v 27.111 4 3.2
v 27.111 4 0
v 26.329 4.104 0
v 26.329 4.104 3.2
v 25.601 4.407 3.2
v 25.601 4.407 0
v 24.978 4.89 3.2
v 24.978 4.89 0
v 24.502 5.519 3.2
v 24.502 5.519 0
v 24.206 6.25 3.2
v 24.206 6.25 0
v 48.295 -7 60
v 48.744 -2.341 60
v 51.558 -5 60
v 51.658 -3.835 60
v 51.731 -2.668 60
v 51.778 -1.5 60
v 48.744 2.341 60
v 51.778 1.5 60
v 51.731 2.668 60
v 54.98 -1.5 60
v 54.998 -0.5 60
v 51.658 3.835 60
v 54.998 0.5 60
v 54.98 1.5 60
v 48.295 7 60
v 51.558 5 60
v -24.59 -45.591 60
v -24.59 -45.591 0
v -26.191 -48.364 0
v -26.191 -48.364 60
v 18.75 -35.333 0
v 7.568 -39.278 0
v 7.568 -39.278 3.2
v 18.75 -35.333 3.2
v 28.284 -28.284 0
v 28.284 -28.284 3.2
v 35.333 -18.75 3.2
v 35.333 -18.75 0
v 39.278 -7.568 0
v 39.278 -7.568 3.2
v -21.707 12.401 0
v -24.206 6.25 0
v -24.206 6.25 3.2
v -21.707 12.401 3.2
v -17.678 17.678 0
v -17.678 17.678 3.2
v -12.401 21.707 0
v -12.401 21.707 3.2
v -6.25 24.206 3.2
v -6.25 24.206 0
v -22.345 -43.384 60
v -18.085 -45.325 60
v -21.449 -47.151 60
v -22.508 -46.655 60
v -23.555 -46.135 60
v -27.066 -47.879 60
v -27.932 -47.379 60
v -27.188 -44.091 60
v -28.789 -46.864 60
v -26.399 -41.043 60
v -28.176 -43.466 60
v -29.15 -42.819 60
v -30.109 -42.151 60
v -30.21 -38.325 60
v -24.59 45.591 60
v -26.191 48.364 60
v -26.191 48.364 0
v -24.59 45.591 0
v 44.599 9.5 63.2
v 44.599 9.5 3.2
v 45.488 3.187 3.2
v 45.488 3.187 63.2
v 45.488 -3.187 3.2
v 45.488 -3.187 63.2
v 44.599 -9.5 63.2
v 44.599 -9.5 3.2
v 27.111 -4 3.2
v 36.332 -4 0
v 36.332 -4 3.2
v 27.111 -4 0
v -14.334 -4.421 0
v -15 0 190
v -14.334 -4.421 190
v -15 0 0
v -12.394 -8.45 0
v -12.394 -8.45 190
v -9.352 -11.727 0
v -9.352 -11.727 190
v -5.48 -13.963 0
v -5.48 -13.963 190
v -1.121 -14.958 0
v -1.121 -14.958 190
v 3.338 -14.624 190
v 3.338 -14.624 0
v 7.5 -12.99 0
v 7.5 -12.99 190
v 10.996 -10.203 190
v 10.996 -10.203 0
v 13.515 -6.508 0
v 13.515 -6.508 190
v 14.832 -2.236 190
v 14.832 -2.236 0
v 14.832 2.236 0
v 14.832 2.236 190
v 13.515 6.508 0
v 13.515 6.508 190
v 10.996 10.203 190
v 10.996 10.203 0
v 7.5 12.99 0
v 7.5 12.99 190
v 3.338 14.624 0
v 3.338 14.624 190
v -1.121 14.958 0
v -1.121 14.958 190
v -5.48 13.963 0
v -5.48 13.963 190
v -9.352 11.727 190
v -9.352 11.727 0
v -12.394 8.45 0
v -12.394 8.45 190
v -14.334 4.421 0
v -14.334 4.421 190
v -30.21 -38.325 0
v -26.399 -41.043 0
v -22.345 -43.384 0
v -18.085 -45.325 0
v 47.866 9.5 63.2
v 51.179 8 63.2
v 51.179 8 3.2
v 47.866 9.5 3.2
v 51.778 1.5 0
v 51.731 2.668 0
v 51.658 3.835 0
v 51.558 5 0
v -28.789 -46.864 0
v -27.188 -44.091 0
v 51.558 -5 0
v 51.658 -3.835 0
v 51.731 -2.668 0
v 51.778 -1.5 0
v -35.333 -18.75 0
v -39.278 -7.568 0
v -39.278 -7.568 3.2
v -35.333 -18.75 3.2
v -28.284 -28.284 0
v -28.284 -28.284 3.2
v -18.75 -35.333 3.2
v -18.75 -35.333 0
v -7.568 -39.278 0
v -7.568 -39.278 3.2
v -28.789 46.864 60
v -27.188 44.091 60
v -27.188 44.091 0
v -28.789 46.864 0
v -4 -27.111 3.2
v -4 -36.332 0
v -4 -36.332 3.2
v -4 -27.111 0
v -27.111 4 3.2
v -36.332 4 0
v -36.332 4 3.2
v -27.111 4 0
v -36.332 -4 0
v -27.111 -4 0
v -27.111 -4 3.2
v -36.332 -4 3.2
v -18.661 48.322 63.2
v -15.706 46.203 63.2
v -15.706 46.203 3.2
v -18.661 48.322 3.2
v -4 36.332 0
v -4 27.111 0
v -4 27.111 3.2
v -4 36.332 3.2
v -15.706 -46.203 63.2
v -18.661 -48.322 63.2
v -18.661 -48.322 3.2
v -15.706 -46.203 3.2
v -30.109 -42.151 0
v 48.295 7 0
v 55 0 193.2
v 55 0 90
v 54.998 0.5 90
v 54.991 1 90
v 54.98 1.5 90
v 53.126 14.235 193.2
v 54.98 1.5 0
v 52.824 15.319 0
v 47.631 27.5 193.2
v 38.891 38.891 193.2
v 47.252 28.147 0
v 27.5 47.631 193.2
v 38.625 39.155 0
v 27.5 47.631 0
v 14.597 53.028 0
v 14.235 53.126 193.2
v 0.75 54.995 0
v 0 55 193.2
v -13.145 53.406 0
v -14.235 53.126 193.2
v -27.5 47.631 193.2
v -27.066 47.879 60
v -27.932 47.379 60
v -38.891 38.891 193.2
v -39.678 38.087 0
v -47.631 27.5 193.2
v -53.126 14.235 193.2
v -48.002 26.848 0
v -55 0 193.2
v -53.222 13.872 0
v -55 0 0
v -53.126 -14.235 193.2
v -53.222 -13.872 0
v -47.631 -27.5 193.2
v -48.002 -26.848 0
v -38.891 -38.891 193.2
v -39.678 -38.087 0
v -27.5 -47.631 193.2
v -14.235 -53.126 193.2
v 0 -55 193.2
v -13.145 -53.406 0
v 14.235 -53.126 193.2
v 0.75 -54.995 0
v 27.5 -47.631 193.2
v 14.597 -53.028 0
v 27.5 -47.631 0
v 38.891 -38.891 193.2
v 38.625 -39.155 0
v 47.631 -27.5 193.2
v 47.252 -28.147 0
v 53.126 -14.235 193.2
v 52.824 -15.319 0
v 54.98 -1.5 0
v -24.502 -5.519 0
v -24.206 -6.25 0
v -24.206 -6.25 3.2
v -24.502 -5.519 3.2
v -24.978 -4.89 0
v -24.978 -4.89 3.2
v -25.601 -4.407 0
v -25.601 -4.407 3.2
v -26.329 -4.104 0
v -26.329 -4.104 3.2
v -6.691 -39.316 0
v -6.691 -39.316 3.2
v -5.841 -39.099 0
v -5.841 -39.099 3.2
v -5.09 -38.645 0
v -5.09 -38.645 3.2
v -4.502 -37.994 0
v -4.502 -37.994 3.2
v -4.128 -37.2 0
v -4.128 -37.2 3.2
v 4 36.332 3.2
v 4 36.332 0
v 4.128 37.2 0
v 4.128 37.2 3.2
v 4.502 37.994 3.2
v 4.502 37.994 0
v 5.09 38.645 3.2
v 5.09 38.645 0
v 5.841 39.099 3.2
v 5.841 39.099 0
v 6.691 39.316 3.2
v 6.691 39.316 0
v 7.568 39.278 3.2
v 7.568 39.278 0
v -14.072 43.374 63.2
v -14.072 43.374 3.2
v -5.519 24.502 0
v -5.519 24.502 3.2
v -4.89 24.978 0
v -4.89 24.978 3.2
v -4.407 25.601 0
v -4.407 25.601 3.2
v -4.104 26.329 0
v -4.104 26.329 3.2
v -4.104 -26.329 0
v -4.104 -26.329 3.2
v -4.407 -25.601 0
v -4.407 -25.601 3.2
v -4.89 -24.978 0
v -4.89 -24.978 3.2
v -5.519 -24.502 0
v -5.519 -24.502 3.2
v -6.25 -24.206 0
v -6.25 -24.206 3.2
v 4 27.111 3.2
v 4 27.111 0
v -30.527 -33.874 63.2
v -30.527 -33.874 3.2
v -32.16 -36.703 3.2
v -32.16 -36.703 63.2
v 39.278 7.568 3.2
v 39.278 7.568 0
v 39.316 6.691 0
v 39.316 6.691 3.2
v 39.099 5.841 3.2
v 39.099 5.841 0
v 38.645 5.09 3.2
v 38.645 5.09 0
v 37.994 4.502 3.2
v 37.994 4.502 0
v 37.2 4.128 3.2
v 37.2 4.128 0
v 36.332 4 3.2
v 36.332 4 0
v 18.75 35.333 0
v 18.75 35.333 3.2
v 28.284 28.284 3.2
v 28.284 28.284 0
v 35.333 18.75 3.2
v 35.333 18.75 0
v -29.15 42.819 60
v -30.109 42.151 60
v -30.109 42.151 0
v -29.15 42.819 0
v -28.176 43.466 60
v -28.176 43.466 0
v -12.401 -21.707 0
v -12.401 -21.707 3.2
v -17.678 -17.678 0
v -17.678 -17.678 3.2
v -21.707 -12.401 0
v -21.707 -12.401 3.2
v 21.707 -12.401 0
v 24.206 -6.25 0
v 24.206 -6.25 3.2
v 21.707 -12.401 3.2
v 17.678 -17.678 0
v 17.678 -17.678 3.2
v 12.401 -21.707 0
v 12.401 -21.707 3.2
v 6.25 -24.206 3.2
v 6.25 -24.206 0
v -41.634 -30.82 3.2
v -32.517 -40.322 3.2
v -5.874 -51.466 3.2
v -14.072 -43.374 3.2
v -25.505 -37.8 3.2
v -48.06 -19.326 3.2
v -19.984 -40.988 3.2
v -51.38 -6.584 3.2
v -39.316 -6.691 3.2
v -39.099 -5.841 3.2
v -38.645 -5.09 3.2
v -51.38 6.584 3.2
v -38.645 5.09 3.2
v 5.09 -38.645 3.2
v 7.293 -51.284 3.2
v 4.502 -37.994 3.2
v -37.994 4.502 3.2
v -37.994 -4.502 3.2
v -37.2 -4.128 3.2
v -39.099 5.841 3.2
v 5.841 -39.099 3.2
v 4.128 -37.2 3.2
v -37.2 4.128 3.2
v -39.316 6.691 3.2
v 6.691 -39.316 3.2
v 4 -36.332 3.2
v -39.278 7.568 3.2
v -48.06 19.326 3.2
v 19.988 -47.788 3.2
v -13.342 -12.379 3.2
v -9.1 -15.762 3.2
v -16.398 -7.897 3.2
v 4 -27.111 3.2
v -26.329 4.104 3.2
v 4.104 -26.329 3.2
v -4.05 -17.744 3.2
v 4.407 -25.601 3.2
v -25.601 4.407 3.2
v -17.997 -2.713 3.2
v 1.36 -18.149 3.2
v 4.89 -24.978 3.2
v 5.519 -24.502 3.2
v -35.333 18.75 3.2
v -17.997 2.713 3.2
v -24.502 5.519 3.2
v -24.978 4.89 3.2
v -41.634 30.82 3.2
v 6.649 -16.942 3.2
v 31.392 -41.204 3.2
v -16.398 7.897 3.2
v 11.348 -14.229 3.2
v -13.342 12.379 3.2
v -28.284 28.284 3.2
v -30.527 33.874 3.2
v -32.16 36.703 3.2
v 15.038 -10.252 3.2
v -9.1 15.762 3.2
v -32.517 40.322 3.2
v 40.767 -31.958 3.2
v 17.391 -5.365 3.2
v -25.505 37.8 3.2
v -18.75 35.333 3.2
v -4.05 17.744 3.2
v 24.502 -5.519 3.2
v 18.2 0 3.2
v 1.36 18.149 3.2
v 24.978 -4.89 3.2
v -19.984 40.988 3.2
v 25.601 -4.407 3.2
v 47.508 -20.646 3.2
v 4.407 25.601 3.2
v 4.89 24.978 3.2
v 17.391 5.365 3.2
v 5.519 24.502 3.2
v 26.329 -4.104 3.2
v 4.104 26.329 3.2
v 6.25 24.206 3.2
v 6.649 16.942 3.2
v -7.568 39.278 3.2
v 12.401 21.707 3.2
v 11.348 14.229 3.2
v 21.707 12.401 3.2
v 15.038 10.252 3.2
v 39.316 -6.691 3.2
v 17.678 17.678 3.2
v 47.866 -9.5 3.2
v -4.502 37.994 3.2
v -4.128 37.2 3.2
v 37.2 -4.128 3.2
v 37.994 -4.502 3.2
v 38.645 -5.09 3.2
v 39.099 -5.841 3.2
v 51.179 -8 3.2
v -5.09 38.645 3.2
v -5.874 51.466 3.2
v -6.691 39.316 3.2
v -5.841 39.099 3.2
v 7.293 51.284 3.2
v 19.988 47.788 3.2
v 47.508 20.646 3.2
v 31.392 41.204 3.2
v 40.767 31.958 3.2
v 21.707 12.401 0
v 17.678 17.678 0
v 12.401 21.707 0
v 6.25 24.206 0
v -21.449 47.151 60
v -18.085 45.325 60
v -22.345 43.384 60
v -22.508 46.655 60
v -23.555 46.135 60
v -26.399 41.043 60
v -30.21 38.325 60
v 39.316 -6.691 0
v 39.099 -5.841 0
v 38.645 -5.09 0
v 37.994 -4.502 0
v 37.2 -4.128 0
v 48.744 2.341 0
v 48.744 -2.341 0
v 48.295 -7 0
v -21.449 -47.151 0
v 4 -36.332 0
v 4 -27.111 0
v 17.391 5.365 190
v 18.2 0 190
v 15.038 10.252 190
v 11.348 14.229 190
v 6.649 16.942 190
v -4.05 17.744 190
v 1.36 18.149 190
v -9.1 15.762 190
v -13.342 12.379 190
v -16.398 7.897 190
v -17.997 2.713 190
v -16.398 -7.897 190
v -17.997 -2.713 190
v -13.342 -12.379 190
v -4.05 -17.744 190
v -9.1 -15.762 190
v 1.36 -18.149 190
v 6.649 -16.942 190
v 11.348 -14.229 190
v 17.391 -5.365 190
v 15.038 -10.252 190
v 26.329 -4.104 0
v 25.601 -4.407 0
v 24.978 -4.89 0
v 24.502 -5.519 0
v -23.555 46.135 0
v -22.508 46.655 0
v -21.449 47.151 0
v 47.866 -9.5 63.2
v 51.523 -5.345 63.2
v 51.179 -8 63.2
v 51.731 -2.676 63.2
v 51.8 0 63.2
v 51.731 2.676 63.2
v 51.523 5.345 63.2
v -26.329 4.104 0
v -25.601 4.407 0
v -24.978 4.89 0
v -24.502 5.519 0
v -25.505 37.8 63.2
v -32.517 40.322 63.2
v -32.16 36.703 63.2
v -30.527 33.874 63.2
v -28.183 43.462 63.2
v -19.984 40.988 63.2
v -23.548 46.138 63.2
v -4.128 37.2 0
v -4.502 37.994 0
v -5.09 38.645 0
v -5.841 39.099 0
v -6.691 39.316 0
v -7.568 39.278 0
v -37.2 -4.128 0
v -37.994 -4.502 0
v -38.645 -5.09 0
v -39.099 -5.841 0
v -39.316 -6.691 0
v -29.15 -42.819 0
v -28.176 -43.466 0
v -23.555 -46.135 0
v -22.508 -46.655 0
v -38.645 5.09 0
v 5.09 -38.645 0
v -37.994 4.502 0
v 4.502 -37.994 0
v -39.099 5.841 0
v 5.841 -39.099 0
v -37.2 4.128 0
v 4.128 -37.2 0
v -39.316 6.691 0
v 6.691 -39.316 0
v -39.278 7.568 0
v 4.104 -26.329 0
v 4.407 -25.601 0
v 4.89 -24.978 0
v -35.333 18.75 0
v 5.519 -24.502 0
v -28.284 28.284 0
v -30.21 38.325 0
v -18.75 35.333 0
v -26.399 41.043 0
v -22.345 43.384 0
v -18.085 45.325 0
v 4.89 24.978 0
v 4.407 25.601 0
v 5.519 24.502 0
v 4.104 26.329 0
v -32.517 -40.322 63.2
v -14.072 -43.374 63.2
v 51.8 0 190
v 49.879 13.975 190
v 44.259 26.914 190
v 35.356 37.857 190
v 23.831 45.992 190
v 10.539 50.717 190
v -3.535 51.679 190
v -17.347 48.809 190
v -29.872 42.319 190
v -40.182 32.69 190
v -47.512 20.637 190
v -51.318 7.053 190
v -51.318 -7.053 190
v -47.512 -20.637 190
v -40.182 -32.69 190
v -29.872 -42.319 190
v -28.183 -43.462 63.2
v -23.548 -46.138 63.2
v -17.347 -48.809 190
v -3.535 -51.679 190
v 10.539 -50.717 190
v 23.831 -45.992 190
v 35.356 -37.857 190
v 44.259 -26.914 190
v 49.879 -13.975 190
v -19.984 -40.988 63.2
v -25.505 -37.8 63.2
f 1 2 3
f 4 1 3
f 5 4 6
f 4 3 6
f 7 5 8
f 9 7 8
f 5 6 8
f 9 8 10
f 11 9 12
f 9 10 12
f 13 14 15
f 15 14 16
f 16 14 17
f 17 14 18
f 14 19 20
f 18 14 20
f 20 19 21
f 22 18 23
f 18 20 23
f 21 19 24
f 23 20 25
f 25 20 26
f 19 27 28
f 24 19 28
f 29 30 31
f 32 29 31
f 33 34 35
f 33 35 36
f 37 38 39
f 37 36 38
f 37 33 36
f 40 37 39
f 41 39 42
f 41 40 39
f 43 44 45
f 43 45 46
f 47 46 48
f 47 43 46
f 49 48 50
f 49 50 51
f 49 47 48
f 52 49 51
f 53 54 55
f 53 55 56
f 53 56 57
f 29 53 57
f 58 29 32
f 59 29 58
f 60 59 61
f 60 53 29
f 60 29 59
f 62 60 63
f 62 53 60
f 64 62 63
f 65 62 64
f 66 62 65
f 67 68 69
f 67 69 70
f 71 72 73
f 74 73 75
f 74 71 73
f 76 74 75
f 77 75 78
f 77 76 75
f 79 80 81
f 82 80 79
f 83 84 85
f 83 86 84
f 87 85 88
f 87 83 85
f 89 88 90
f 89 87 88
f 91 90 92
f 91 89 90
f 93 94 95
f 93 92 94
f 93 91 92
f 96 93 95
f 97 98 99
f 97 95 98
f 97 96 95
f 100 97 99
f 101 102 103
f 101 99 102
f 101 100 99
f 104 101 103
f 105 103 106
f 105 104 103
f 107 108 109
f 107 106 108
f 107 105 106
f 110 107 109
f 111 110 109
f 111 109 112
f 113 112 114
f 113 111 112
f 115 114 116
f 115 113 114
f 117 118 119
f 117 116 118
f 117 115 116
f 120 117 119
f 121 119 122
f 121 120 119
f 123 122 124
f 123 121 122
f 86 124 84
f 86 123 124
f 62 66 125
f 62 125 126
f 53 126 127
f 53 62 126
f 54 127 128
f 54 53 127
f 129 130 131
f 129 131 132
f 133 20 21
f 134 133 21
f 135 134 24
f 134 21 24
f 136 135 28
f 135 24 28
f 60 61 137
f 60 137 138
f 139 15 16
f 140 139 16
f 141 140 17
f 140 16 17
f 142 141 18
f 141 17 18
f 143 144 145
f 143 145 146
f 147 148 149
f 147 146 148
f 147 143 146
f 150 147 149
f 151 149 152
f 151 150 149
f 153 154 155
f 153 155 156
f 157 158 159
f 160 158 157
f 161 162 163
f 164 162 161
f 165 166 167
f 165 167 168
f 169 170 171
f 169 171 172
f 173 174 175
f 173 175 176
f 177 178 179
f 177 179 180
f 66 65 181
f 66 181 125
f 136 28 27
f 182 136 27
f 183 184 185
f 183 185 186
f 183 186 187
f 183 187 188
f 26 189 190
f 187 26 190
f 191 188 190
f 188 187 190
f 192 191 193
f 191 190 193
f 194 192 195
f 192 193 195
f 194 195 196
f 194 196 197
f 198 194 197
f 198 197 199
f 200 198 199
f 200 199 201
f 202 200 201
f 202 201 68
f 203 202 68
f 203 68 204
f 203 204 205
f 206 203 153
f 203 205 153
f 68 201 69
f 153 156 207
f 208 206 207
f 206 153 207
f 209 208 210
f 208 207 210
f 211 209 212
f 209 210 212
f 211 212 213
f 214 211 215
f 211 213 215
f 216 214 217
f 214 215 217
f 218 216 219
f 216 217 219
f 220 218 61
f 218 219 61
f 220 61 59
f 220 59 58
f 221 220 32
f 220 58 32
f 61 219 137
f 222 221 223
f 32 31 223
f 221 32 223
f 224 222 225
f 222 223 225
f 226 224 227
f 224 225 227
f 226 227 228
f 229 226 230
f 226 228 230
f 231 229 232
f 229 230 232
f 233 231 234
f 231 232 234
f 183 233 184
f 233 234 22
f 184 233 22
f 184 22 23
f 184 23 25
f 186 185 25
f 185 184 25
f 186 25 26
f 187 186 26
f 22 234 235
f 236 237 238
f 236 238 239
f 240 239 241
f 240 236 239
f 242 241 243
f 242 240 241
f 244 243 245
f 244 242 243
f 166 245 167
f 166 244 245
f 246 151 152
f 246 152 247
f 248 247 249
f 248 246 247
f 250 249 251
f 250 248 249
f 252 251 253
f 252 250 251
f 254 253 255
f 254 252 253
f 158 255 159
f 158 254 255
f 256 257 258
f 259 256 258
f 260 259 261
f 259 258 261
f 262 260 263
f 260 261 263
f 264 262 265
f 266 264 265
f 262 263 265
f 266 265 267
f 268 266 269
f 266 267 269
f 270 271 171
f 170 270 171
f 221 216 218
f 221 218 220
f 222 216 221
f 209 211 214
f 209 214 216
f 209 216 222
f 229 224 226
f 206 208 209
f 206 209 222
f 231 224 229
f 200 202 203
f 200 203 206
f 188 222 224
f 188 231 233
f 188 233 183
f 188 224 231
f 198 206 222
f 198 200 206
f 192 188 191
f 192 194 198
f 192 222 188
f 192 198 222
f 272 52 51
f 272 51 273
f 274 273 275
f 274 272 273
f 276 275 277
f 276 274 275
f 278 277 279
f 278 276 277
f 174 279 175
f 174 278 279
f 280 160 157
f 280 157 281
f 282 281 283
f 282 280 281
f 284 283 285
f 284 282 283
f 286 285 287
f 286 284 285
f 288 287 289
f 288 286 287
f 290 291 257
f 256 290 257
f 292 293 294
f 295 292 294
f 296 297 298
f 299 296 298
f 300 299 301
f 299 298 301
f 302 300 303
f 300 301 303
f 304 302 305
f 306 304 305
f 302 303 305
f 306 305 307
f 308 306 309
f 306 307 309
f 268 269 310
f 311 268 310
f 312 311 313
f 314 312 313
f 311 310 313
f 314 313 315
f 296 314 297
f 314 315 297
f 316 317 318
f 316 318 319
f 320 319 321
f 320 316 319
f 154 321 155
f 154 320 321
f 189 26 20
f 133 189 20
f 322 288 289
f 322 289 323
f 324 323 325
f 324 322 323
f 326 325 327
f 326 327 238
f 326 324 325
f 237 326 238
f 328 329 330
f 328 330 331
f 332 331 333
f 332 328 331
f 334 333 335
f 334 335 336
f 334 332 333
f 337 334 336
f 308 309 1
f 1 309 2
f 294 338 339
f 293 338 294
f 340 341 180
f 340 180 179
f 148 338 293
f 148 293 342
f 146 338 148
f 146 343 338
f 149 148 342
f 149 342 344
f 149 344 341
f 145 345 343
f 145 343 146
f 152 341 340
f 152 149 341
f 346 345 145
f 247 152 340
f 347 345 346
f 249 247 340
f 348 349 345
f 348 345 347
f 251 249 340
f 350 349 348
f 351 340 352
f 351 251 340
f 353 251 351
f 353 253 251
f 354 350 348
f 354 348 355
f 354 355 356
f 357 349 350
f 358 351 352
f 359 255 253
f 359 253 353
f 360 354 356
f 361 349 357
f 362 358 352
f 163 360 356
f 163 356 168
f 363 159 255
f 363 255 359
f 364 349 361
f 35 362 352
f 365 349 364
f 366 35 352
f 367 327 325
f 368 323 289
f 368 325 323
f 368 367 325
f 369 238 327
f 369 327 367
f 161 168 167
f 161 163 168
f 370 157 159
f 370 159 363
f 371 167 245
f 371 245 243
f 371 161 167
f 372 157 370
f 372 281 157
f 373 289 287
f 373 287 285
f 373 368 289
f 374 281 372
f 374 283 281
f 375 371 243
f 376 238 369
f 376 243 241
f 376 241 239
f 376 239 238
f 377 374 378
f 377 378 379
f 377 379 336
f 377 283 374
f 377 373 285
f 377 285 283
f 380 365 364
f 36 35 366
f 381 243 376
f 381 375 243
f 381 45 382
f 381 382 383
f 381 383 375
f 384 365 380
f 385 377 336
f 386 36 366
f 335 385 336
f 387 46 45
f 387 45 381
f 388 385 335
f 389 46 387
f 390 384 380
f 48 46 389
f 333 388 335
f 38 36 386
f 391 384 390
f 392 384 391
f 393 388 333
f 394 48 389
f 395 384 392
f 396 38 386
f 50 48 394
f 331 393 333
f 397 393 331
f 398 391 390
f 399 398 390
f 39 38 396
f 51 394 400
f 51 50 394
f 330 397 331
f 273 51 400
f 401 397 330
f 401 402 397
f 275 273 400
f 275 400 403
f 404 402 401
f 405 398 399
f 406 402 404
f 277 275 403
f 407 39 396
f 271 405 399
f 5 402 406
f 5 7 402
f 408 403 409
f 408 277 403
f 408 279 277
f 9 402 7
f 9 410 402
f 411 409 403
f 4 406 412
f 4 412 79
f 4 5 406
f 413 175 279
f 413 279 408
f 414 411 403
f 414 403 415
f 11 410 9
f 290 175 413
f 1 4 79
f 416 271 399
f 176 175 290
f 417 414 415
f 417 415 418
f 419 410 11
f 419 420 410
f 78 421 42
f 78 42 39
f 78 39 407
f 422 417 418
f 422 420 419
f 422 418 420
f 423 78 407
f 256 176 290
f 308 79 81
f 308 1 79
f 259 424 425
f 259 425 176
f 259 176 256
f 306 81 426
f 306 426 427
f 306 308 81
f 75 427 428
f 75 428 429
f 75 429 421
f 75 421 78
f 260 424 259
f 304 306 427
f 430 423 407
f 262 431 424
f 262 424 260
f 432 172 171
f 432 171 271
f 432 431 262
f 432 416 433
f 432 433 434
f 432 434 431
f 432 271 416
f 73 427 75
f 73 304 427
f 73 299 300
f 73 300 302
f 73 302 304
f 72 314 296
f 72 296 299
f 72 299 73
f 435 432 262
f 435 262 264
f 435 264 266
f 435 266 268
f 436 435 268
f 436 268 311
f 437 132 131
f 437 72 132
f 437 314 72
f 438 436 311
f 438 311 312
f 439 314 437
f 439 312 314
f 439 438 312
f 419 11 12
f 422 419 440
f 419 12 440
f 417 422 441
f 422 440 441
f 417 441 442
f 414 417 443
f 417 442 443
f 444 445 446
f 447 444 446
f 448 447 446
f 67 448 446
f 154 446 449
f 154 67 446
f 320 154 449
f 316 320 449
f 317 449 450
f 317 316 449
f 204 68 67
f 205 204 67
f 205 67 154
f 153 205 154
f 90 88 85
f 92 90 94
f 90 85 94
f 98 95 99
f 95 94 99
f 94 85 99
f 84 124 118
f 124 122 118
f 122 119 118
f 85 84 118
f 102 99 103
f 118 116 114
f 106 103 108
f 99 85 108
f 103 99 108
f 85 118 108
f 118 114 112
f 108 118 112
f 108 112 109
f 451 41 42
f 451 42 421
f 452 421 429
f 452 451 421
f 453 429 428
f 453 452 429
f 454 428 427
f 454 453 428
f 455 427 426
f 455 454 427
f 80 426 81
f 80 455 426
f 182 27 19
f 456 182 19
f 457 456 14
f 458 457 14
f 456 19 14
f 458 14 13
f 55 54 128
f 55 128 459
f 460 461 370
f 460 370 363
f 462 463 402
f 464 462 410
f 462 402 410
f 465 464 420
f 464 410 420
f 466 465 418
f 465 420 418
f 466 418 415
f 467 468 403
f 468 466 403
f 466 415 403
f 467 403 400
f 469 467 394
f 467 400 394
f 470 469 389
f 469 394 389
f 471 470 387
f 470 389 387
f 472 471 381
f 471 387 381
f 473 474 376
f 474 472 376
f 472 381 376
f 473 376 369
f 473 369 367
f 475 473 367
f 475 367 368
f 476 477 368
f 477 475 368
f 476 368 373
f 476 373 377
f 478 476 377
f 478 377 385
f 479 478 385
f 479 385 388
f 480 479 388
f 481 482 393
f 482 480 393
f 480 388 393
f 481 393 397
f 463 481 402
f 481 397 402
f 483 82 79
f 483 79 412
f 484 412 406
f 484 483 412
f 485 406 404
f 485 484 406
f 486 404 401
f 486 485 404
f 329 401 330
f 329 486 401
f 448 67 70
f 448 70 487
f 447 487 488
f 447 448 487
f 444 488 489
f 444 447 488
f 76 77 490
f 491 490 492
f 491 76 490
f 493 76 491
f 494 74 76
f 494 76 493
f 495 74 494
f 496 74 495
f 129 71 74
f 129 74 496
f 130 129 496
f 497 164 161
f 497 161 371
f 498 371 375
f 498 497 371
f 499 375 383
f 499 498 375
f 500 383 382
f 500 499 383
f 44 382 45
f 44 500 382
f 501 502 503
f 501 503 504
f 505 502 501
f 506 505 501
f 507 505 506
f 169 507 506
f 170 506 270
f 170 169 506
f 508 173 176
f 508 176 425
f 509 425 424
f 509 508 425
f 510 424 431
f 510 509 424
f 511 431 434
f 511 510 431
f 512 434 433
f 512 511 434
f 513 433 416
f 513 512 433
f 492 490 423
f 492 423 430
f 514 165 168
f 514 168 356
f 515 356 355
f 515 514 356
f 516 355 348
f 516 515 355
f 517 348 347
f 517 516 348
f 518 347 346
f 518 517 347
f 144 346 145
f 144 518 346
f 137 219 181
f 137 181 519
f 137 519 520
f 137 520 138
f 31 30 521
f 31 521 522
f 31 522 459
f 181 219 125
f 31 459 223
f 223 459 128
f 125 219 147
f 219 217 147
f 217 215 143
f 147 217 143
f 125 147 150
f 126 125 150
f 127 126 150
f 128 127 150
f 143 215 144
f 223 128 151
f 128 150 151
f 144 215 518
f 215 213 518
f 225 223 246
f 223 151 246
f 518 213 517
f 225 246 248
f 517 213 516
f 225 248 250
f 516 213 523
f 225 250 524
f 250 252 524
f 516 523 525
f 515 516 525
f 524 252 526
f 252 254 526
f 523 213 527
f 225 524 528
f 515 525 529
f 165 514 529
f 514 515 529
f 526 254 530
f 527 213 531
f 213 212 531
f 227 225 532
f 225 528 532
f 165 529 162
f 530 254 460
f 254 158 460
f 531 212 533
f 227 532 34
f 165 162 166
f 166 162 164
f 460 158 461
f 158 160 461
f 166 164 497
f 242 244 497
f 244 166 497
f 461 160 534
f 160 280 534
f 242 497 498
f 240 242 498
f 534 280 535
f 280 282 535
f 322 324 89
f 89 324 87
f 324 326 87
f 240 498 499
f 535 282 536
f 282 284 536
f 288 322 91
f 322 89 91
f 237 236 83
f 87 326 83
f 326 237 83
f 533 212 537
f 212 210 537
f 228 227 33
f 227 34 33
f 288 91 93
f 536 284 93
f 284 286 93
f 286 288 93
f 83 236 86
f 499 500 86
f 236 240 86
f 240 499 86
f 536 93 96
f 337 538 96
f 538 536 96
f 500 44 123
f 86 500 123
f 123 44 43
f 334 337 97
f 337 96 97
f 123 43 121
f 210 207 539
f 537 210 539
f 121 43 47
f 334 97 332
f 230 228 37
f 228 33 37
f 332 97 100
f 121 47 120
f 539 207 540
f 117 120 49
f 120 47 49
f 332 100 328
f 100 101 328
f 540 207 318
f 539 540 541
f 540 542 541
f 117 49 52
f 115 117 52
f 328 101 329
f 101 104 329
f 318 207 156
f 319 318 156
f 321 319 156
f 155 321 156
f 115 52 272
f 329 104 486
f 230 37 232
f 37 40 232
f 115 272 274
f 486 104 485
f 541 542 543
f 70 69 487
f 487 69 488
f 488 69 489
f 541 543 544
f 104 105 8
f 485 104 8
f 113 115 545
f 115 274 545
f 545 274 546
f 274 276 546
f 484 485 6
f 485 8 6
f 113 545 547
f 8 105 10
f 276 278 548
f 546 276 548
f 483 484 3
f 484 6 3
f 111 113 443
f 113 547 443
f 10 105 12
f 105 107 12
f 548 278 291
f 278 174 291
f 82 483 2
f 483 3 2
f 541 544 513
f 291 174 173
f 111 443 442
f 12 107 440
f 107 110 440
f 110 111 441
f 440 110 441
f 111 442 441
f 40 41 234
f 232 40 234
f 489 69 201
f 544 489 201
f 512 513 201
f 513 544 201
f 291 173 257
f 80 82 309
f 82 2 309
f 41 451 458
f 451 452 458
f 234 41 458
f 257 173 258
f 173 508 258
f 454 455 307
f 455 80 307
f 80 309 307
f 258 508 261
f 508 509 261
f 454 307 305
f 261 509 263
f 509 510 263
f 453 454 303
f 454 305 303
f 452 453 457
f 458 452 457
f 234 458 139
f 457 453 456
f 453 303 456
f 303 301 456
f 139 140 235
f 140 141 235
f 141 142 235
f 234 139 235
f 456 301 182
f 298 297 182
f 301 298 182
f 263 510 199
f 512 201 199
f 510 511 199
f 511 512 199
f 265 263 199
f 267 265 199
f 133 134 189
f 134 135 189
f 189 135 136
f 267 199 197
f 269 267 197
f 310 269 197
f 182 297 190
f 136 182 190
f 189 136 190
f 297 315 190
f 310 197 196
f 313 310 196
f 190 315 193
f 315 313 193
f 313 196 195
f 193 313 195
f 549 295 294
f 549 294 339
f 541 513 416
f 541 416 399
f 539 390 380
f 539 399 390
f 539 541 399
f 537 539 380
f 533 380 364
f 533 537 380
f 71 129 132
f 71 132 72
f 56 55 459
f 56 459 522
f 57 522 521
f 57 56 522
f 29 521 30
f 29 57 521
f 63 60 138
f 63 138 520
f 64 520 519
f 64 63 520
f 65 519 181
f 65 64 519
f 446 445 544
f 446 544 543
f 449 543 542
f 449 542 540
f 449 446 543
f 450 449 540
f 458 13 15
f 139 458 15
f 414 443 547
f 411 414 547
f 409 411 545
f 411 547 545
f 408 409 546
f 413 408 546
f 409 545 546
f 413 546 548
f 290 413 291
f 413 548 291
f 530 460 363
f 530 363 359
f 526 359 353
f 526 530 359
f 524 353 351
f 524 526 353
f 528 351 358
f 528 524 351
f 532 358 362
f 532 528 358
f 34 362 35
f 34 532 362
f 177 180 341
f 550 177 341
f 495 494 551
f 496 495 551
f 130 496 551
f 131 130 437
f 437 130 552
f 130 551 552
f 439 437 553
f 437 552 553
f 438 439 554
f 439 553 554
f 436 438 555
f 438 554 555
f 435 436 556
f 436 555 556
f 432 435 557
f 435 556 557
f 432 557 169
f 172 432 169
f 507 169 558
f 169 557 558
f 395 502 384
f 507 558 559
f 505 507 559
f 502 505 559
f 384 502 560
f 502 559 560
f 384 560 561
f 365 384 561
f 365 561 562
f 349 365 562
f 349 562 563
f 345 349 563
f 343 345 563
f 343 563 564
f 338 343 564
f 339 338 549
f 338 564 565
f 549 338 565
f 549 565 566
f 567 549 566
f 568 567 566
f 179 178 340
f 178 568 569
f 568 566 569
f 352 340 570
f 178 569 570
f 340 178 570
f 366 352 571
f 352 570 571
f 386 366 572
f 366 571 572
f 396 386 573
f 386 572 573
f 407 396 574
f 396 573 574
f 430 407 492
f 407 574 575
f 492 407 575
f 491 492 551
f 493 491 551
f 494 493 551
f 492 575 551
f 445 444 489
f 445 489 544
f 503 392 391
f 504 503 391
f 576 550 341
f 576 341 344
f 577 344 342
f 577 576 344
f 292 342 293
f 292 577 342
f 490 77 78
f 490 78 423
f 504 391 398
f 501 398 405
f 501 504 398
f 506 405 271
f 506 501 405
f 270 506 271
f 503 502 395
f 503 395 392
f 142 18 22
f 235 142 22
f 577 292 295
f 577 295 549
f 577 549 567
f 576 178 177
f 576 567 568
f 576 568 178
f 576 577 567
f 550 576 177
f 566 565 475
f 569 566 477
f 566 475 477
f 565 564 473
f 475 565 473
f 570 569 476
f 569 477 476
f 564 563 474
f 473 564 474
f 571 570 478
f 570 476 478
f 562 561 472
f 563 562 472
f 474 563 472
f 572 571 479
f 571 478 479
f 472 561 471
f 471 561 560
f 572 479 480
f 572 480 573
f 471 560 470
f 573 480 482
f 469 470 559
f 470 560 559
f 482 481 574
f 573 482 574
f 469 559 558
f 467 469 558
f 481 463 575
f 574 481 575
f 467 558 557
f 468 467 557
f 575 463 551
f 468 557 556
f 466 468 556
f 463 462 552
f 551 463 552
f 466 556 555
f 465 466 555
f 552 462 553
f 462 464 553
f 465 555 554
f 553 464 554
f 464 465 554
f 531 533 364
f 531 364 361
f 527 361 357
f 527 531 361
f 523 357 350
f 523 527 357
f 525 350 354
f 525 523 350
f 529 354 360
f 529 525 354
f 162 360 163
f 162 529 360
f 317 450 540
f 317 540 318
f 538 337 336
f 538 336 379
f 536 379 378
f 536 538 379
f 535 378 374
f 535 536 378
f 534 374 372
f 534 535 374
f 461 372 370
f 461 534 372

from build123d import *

# Parameters (mm, degrees)
SKETCH_1_R          = 55
EXTRUDE_1_DEPTH     = 190
SKETCH_2_R          = 51.8
CUT_EXTRUDE_1_DEPTH = 186.8
SKETCH_3_R          = 15
CUT_EXTRUDE_2_DEPTH = 10
SKETCH_4_R          = 18.2
SKETCH_4_R_2        = 15
EXTRUDE_2_DEPTH     = 188
SKETCH_5_R          = 55
EXTRUDE_5_DEPTH     = 3.2
EXTRUDE_6_DEPTH     = 1.5
EXTRUDE_START       = -63.2
EXTRUDE_7_DEPTH     = 63.2
CUT_EXTRUDE_START   = -60
CUT_EXTRUDE_4_DEPTH = 60
SKETCH_12_R         = 138.367390037
SKETCH_12_R_2       = 55
CUT_EXTRUDE_5_DEPTH = 135
CUT_EXTRUDE_6_DEPTH = 10


with BuildPart() as part:
    # 草图1 → 凸台-拉伸1 (new body)
    with BuildSketch(Plane.XY):
        Circle(SKETCH_1_R)
    extrude(amount=EXTRUDE_1_DEPTH)

    # 草图2 → 切除-拉伸1 (cut)
    with BuildSketch(Plane.XY.offset(190)):
        Circle(SKETCH_2_R)
    extrude(amount=-CUT_EXTRUDE_1_DEPTH, mode=Mode.SUBTRACT)

    # 草图3 → 切除-拉伸2 (cut)
    with BuildSketch(Plane(origin=(0, 0, 0), x_dir=(-1, 0, 0), z_dir=(0, 0, -1))):
        Circle(SKETCH_3_R)
    extrude(amount=-CUT_EXTRUDE_2_DEPTH, mode=Mode.SUBTRACT)

    # 草图4 → 凸台-拉伸2 (add)
    with BuildSketch(Plane.XY.offset(3.2)):
        Circle(SKETCH_4_R)
        with Locations(Location((0, 0, 0), (0, 0, 180))):
            Circle(SKETCH_4_R_2, mode=Mode.SUBTRACT)
    extrude(amount=EXTRUDE_2_DEPTH)

    # 草图5 → 凸台-拉伸5 (add)
    with BuildSketch(Plane.XY.offset(190)):
        Circle(SKETCH_5_R)
    extrude(amount=EXTRUDE_5_DEPTH)

    # 草图8 → 凸台-拉伸6 (add, symmetric)
    with BuildSketch(Plane(origin=(0, 0, 0), x_dir=(-1, 0, 0), z_dir=(0, 1, 0))):
        Polygon((-55, 90), (-135, 65), (-135, -15), (-55, 0), (-53, 0), (-53, 90), align=None)
    extrude(amount=EXTRUDE_6_DEPTH, both=True)

    # 草图9 → 凸台-拉伸7 (add)
    with BuildSketch(Plane(origin=(0, 0, 0), x_dir=(-1, 0, 0), z_dir=(0, 0, -1)).offset(EXTRUDE_START)):
        with BuildLine():
            Line((-51.178511116, 8), (-47.866376508, 9.5))
            Line((-47.866376508, 9.5), (-44.599439458, 9.5))
            ThreePointArc((-44.599439458, 9.5), (-45.6, 0), (-44.599439458, -9.5))
            Line((-44.599439458, -9.5), (-47.866376508, -9.5))
            Line((-47.866376508, -9.5), (-51.178511116, -8))
            ThreePointArc((-51.178511116, -8), (-51.8, 0), (-51.178511116, 8))
        make_face()
        with BuildLine():
            Line((32.517458788, 40.321890754), (32.16042959, 36.703498043))
            Line((32.16042959, 36.703498043), (30.526961065, 33.874247565))
            ThreePointArc((30.526961065, 33.874247565), (22.8, 39.490758413), (14.072478393, 43.374247565))
            Line((14.072478393, 43.374247565), (15.705946918, 46.203498043))
            Line((15.705946918, 46.203498043), (18.661052327, 48.321890754))
            ThreePointArc((18.661052327, 48.321890754), (25.9, 44.860115916), (32.517458788, 40.321890754))
        make_face()
        with BuildLine():
            Line((18.661052327, -48.321890754), (15.705946918, -46.203498043))
            Line((15.705946918, -46.203498043), (14.072478393, -43.374247565))
            ThreePointArc((14.072478393, -43.374247565), (22.8, -39.490758413), (30.526961065, -33.874247565))
            Line((30.526961065, -33.874247565), (32.16042959, -36.703498043))
            Line((32.16042959, -36.703498043), (32.517458788, -40.321890754))
            ThreePointArc((32.517458788, -40.321890754), (25.9, -44.860115916), (18.661052327, -48.321890754))
        make_face()
    extrude(amount=EXTRUDE_7_DEPTH)

    # 草图11 → 切除-拉伸4 (cut)
    with BuildSketch(Plane(origin=(0, 0, 0), x_dir=(-1, 0, 0), z_dir=(0, 0, -1)).offset(CUT_EXTRUDE_START)):
        with BuildLine():
            Line((-65.998357279, 1.5), (-51.778277298, 1.5))
            ThreePointArc((-51.778277298, 1.5), (-51.697827643, 3.251863624), (-51.558122541, 5))
            Line((-51.558122541, 5), (-48.29534139, 7))
            ThreePointArc((-48.29534139, 7), (-48.8, 0), (-48.29534139, -7))
            Line((-48.29534139, -7), (-51.558122541, -5))
            ThreePointArc((-51.558122541, -5), (-51.697827643, -3.251863624), (-51.778277298, -1.5))
            Line((-51.778277298, -1.5), (-65.998357279, -1.5))
            Line((-65.998357279, -1.5), (-65.998357279, 1.5))
        make_face()
        with BuildLine():
            Line((34.298216745, 56.406254012), (31.700140534, 57.906254012))
            Line((31.700140534, 57.906254012), (24.590100544, 45.591303505))
            ThreePointArc((24.590100544, 45.591303505), (23.032717313, 46.397563871), (21.448934252, 47.150643892))
            Line((21.448934252, 47.150643892), (18.085492869, 45.324992528))
            ThreePointArc((18.085492869, 45.324992528), (24.4, 42.262039705), (30.209848522, 38.324992528))
            Line((30.209848522, 38.324992528), (30.10918829, 42.150643892))
            ThreePointArc((30.10918829, 42.150643892), (28.665110329, 43.145700247), (27.188176755, 44.091303505))
            Line((27.188176755, 44.091303505), (34.298216745, 56.406254012))
        make_face()
        with BuildLine():
            Line((31.700140534, -57.906254012), (34.298216745, -56.406254012))
            Line((34.298216745, -56.406254012), (27.188176755, -44.091303505))
            ThreePointArc((27.188176755, -44.091303505), (28.665110329, -43.145700247), (30.10918829, -42.150643892))
            Line((30.10918829, -42.150643892), (30.209848522, -38.324992528))
            ThreePointArc((30.209848522, -38.324992528), (24.4, -42.262039705), (18.085492869, -45.324992528))
            Line((18.085492869, -45.324992528), (21.448934252, -47.150643892))
            ThreePointArc((21.448934252, -47.150643892), (23.032717313, -46.397563871), (24.590100544, -45.591303505))
            Line((24.590100544, -45.591303505), (31.700140534, -57.906254012))
        make_face()
    extrude(amount=CUT_EXTRUDE_4_DEPTH, mode=Mode.SUBTRACT)

    # 草图12 → 切除-拉伸5 (cut, symmetric)
    with BuildSketch(Plane(origin=(0, 0, 0), x_dir=(-1, 0, 0), z_dir=(0, 0, -1))):
        Circle(SKETCH_12_R)
        with Locations(Location((0, 0, 0), (0, 0, 58.437194054))):
            Circle(SKETCH_12_R_2, mode=Mode.SUBTRACT)
    extrude(amount=CUT_EXTRUDE_5_DEPTH, both=True, mode=Mode.SUBTRACT)

    # 草图13 → 切除-拉伸6 (cut)
    with BuildSketch(Plane(origin=(0, 0, 0), x_dir=(-1, 0, 0), z_dir=(0, 0, -1))):
        with BuildLine():
            Line((4, 27.110883423), (4, 36.331804249))
            ThreePointArc((4, 36.331804249), (5.08985638, 38.645103052), (7.567567568, 39.277626215))
            ThreePointArc((7.567567568, 39.277626215), (28.284271247, 28.284271247), (39.277626215, 7.567567568))
            ThreePointArc((39.277626215, 7.567567568), (38.645103052, 5.08985638), (36.331804249, 4))
            Line((36.331804249, 4), (27.110883423, 4))
            ThreePointArc((27.110883423, 4), (25.273766116, 4.628291755), (24.206145914, 6.25))
            ThreePointArc((24.206145914, 6.25), (17.67766953, 17.67766953), (6.25, 24.206145914))
            ThreePointArc((6.25, 24.206145914), (4.628291755, 25.273766116), (4, 27.110883423))
        make_face()
        with BuildLine():
            Line((-4, 27.110883423), (-4, 36.331804249))
            ThreePointArc((-4, 36.331804249), (-5.08985638, 38.645103052), (-7.567567568, 39.277626215))
            ThreePointArc((-7.567567568, 39.277626215), (-28.284271247, 28.284271247), (-39.277626215, 7.567567568))
            ThreePointArc((-39.277626215, 7.567567568), (-38.645103052, 5.08985638), (-36.331804249, 4))
            Line((-36.331804249, 4), (-27.110883423, 4))
            ThreePointArc((-27.110883423, 4), (-25.273766116, 4.628291755), (-24.206145914, 6.25))
            ThreePointArc((-24.206145914, 6.25), (-17.67766953, 17.67766953), (-6.25, 24.206145914))
            ThreePointArc((-6.25, 24.206145914), (-4.628291755, 25.273766116), (-4, 27.110883423))
        make_face()
        with BuildLine():
            Line((27.110883423, -4), (36.331804249, -4))
            ThreePointArc((36.331804249, -4), (38.645103052, -5.08985638), (39.277626215, -7.567567568))
            ThreePointArc((39.277626215, -7.567567568), (28.284271247, -28.284271247), (7.567567568, -39.277626215))
            ThreePointArc((7.567567568, -39.277626215), (5.08985638, -38.645103052), (4, -36.331804249))
            Line((4, -36.331804249), (4, -27.110883423))
            ThreePointArc((4, -27.110883423), (4.628291755, -25.273766116), (6.25, -24.206145914))
            ThreePointArc((6.25, -24.206145914), (17.67766953, -17.67766953), (24.206145914, -6.25))
            ThreePointArc((24.206145914, -6.25), (25.273766116, -4.628291755), (27.110883423, -4))
        make_face()
        with BuildLine():
            Line((-4, -27.110883423), (-4, -36.331804249))
            ThreePointArc((-4, -36.331804249), (-5.08985638, -38.645103052), (-7.567567568, -39.277626215))
            ThreePointArc((-7.567567568, -39.277626215), (-28.284271247, -28.284271247), (-39.277626215, -7.567567568))
            ThreePointArc((-39.277626215, -7.567567568), (-38.645103052, -5.08985638), (-36.331804249, -4))
            Line((-36.331804249, -4), (-27.110883423, -4))
            ThreePointArc((-27.110883423, -4), (-25.273766116, -4.628291755), (-24.206145914, -6.25))
            ThreePointArc((-24.206145914, -6.25), (-17.67766953, -17.67766953), (-6.25, -24.206145914))
            ThreePointArc((-6.25, -24.206145914), (-4.628291755, -25.273766116), (-4, -27.110883423))
        make_face()
    extrude(amount=-CUT_EXTRUDE_6_DEPTH, mode=Mode.SUBTRACT)


solid = part.part
